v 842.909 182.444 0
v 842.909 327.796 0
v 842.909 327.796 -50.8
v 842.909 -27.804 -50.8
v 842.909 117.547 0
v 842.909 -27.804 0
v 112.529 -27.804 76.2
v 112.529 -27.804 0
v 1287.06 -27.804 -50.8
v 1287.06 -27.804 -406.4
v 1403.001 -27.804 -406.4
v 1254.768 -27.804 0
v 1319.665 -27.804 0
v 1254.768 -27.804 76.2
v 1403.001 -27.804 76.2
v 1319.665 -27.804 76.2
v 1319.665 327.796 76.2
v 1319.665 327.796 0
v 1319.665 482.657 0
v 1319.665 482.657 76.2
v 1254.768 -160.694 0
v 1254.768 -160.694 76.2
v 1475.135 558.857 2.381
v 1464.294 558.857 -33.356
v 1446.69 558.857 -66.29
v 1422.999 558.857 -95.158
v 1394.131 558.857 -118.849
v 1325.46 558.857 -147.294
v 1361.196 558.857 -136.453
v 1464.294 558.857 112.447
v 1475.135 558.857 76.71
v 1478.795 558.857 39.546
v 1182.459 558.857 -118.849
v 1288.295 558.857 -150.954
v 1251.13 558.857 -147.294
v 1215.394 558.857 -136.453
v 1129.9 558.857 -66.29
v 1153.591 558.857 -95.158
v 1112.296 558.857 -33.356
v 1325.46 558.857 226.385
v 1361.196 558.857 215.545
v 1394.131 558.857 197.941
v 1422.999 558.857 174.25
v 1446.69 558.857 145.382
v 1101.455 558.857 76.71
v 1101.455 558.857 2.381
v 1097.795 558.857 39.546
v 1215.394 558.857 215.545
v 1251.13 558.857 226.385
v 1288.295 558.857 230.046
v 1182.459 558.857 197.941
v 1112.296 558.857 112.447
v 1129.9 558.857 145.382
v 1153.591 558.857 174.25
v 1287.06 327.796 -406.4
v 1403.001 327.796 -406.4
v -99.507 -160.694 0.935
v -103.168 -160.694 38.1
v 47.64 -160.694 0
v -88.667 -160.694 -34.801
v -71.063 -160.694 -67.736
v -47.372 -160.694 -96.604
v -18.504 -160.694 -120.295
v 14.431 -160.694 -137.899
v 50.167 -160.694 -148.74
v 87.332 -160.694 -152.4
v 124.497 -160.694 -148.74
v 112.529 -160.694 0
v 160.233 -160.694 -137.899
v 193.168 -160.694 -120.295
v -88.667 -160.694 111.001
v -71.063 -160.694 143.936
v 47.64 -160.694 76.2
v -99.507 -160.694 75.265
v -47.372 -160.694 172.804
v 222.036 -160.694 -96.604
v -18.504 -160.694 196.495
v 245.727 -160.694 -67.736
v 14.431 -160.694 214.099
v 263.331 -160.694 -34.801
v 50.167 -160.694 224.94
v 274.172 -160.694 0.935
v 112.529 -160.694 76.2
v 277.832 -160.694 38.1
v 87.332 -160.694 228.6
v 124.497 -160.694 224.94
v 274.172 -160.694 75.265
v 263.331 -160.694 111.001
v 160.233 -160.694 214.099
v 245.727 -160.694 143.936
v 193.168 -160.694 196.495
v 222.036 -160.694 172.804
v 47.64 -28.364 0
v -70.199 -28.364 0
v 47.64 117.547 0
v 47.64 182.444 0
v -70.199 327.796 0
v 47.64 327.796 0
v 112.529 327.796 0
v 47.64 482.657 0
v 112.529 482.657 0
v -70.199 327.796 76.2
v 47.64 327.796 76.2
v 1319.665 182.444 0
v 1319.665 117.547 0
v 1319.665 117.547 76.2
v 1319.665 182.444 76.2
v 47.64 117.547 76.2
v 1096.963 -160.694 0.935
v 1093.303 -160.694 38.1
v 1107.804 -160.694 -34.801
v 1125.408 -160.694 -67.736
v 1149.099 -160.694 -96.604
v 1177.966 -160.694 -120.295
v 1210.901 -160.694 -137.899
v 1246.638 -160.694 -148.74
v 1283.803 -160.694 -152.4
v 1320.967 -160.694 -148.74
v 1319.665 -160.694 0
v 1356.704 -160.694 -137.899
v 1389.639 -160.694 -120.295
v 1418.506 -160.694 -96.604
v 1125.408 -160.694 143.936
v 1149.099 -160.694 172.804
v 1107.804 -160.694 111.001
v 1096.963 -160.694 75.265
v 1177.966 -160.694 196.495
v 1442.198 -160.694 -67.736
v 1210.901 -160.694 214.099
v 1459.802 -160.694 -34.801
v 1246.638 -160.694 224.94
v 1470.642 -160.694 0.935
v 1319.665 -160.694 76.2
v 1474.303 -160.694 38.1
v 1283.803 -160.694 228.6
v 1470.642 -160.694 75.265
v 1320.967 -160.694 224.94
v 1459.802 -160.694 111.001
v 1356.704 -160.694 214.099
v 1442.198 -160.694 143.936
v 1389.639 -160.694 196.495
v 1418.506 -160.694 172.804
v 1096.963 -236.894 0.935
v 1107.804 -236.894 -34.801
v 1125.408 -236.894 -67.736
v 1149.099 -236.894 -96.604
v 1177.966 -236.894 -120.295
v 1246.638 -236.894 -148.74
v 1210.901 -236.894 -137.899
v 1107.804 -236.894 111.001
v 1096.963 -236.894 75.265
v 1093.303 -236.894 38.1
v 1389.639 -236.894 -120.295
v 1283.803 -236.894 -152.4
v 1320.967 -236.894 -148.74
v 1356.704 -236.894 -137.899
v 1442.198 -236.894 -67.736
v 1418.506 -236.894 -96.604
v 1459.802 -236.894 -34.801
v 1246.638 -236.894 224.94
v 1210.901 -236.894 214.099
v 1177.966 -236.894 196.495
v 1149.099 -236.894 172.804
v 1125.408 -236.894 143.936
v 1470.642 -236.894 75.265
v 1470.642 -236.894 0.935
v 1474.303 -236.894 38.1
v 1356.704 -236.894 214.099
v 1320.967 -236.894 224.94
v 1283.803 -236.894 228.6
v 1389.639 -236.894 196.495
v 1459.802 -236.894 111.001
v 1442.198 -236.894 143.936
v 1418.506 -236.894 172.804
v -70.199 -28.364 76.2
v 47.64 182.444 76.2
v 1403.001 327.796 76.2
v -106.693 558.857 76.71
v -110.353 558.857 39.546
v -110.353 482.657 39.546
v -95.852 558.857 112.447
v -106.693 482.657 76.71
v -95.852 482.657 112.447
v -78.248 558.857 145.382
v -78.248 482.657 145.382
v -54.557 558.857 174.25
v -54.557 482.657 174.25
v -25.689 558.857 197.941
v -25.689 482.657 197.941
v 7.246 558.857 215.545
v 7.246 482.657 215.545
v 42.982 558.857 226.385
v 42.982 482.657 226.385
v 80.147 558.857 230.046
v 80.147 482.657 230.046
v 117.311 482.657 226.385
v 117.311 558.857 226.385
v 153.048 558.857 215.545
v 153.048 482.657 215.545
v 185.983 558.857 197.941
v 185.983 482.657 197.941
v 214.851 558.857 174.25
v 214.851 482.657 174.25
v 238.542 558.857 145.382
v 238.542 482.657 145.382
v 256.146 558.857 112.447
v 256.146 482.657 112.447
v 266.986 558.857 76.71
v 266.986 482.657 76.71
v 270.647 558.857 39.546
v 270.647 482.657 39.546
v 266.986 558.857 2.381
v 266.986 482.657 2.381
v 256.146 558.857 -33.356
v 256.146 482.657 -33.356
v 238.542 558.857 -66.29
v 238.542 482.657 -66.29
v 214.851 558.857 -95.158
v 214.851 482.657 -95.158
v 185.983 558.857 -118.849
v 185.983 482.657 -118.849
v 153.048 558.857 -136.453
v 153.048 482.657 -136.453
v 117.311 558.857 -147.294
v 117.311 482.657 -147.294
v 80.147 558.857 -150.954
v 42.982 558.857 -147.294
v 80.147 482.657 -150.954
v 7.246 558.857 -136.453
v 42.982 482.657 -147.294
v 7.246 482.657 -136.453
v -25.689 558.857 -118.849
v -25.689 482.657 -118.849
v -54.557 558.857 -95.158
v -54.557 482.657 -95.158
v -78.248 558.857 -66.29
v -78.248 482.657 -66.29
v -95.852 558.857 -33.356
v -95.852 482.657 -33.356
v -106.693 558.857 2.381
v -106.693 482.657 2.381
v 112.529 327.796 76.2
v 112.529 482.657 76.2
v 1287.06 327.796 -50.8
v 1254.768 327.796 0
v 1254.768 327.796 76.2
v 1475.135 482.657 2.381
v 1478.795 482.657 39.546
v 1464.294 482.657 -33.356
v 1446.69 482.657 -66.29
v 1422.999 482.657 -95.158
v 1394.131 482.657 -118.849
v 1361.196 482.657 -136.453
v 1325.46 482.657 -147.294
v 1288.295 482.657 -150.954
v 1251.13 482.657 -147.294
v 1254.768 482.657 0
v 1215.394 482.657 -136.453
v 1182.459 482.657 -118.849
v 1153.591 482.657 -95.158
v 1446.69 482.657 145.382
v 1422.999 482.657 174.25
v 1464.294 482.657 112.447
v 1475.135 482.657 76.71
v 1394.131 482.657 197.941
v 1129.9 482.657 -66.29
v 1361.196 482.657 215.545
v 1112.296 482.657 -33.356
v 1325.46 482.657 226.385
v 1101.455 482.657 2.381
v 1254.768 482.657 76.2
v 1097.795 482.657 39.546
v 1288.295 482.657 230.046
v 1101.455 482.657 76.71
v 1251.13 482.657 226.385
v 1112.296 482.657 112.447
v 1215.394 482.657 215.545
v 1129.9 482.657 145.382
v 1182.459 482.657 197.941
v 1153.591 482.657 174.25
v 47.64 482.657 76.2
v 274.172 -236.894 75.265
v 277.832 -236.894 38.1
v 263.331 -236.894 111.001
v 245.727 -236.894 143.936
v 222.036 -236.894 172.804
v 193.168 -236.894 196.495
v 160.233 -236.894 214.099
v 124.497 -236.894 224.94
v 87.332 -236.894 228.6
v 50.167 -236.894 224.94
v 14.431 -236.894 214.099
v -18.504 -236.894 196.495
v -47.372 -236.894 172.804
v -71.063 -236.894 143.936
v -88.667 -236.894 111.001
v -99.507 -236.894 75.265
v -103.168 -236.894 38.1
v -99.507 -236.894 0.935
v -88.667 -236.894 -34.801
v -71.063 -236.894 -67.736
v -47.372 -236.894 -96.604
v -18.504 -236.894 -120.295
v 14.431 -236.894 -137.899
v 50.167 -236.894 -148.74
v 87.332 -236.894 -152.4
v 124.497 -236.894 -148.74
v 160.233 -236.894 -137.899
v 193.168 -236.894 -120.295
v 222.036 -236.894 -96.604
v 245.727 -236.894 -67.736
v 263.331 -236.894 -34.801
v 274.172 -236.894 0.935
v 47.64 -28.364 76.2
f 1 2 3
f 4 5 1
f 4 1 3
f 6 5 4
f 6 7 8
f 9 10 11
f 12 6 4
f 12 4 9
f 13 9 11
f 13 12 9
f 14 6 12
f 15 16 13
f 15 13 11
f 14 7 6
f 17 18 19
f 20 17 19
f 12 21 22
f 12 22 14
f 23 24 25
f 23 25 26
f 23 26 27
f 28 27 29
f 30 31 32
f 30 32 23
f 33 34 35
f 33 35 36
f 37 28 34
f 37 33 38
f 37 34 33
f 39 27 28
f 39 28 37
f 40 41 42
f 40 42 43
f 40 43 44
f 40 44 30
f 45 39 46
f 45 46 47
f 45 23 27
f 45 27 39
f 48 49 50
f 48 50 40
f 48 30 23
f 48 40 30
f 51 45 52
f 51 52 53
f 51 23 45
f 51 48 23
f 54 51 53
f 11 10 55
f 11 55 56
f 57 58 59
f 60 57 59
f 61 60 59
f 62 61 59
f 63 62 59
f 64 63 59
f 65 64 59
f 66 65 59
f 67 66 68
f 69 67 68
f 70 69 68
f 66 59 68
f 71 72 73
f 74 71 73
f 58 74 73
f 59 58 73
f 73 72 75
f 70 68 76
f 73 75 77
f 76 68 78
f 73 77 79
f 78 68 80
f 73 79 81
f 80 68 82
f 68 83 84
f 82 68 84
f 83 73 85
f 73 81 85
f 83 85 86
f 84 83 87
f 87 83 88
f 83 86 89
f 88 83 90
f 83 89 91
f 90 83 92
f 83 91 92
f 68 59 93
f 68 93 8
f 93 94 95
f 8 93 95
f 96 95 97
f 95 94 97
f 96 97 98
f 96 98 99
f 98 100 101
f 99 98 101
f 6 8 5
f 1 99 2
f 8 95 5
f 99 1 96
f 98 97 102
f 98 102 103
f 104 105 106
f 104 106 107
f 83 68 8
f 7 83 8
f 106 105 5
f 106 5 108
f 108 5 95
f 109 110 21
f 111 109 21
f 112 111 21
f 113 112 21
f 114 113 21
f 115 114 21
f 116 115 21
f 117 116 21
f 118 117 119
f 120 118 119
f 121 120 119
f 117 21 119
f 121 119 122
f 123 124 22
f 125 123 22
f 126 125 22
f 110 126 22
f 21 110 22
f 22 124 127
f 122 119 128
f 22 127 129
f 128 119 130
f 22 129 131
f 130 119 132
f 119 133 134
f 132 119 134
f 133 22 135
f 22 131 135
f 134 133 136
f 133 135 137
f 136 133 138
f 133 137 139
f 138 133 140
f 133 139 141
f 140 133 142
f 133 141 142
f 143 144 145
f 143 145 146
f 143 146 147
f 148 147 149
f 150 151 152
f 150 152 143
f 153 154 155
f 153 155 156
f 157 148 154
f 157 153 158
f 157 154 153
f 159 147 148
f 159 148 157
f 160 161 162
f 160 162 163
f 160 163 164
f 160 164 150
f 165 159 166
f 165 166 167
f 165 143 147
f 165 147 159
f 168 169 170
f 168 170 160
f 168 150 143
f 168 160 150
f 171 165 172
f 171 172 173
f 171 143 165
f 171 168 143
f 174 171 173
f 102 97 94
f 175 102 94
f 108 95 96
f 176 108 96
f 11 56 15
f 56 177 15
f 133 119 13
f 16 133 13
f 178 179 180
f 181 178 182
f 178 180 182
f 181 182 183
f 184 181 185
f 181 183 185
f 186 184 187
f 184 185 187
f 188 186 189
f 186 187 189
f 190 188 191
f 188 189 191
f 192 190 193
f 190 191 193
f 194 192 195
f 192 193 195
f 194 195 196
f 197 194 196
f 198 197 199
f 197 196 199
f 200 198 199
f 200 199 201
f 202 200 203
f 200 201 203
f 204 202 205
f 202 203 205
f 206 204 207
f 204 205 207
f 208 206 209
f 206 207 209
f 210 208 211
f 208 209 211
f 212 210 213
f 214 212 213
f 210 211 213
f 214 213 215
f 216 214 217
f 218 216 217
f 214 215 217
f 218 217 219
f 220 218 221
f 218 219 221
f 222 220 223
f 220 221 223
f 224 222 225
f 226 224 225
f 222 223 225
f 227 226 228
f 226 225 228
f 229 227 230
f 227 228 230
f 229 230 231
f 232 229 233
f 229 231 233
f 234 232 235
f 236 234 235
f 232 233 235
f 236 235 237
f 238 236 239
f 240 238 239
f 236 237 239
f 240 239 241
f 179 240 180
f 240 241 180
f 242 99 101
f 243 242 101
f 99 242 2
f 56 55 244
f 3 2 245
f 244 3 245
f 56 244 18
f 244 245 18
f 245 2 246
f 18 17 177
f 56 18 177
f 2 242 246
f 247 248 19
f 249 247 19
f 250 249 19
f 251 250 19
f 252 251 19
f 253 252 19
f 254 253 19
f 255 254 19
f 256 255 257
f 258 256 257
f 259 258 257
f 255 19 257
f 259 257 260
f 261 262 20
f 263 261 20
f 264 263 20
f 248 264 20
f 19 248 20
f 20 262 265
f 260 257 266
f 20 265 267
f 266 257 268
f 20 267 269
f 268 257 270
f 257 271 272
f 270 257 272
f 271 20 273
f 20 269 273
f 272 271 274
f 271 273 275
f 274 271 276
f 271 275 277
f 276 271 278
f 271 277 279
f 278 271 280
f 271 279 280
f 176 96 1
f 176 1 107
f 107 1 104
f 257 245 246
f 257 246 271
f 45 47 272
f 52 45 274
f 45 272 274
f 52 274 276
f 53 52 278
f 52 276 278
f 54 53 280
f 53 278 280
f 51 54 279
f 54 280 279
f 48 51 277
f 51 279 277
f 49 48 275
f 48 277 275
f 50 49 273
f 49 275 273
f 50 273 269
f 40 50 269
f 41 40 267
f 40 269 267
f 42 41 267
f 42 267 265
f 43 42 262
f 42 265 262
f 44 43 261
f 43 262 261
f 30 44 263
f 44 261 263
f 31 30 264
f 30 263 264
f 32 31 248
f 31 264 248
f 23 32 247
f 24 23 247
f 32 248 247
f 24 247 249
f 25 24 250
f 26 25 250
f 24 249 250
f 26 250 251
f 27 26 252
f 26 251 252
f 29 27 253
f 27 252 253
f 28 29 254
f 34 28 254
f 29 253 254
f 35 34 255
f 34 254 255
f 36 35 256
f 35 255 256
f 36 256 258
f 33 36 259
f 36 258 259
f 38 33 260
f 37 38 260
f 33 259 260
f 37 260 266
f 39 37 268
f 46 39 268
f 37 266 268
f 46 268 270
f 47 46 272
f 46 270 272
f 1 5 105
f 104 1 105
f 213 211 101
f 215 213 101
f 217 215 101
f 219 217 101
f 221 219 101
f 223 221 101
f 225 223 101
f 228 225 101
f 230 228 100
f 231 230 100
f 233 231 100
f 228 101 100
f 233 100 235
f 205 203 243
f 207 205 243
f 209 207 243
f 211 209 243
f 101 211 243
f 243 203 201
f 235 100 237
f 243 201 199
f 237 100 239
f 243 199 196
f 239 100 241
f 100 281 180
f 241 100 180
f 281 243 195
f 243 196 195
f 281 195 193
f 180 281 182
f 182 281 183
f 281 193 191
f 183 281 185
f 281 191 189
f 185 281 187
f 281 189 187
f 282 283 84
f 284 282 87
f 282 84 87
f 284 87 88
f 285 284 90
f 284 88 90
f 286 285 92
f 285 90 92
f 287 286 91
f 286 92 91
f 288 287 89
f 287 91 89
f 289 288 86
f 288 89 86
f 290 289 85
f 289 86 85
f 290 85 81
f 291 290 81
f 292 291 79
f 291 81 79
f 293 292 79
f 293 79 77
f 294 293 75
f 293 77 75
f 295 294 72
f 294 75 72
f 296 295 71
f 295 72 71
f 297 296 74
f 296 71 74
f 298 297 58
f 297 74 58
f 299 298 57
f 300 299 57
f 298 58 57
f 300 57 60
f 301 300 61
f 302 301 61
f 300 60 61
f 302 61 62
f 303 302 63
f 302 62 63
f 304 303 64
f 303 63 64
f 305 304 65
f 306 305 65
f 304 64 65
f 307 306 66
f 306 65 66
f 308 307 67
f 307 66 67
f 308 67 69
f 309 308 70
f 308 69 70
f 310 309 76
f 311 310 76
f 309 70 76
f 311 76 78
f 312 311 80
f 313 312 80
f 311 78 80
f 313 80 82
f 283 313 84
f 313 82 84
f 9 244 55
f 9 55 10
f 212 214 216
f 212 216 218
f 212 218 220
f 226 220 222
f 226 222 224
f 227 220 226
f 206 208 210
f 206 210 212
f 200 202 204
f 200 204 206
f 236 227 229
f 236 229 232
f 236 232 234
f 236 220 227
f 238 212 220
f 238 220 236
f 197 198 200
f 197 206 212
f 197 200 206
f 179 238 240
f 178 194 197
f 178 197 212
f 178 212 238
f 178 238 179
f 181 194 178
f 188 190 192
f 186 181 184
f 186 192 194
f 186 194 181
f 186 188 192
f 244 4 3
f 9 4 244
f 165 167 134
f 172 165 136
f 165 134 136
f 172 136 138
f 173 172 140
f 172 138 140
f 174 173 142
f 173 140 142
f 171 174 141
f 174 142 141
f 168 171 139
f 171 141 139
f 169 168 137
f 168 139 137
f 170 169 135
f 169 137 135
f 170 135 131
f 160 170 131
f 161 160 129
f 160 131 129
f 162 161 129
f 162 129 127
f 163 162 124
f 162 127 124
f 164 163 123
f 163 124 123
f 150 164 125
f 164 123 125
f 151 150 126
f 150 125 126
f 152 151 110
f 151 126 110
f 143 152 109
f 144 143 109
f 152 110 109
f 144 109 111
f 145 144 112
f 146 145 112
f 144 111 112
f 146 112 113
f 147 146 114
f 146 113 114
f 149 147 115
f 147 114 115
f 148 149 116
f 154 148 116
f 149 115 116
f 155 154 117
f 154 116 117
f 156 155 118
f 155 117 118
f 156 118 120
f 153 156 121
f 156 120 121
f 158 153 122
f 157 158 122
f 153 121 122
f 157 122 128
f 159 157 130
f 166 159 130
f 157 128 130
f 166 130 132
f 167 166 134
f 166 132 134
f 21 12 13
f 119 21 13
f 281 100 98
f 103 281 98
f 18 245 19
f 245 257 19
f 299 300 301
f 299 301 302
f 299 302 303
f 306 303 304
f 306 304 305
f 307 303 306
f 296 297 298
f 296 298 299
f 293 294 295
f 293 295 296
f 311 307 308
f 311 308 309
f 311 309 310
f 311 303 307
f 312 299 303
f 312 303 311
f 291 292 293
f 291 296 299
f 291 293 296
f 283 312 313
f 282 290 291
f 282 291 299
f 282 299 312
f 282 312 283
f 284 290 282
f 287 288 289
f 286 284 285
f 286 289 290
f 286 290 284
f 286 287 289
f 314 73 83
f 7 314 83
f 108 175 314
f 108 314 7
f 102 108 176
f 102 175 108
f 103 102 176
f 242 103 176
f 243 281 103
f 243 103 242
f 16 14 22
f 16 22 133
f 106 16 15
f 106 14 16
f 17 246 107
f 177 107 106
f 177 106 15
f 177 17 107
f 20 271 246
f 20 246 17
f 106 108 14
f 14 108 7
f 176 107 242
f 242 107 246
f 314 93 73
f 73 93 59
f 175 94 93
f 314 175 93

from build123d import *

# Parameters (mm, degrees)
F0_W     = 519.4771289825
F0_H     = 145.3515
F0_W_2   = 78.8426995277
F0_W_3   = 543.9197421074
F0_W_4   = 64.8887902498
F0_W_5   = 117.8393810987
F0_H_2   = 64.897
F0_H_3   = 145.9111776203
F0_W_6   = 64.897
F0_H_4   = 132.8892552004
F0_H_5   = 154.8609585657
F0_W_7   = 83.3352580338
F1_DEPTH = 76.2
F2_R     = 190.5
F3_DEPTH = 76.2
F4_R     = 190.5
F5_DEPTH = 76.2
F6_W     = 560.091412735
F6_H     = 355.6
F7_DEPTH = 50.8
F8_W     = 115.9408456802
F8_H     = 355.6
F9_DEPTH = 355.6


with BuildPart() as f1:
    # F0 (on Top) → F1 (new body)
    with BuildSketch(Plane.XY):
        with Locations((372.2674846649, 44.8714789324)):
            Rectangle(F0_W, F0_H)
        Polygon((112.5289201736, -160.693526268), (112.5289201736, -27.8042710676), (112.5289201736, 117.5472289324), (47.6401299238, 117.5472289324), (47.6401299238, -28.3639486879), (47.6401299238, -160.693526268), align=None)
        with Locations((671.4273989201, 44.8714789324)):
            Rectangle(F0_W_2, F0_H)
        with Locations((982.8086197376, 44.8714789324)):
            Rectangle(F0_W_3, F0_H)
        with Locations((80.0845250487, 255.1199789324)):
            Rectangle(F0_W_4, F0_H)
        Polygon((112.5289201736, 327.7957289324), (112.5289201736, 182.4442289324), (632.0060491562, 182.4442289324), (632.0060491562, 327.7957289324), (539.4007488251, 327.7957289324), align=None)
        with Locations((-11.2795606256, 149.9957289324)):
            Rectangle(F0_W_5, F0_H_2)
        with Locations((-11.2795606256, 44.5916401222)):
            Rectangle(F0_W_5, F0_H_3)
        with Locations((1287.2169907913, 44.8714789324)):
            Rectangle(F0_W_6, F0_H)
        with Locations((1287.2169907913, -94.2488986678)):
            Rectangle(F0_W_6, F0_H_4)
        Polygon((632.0060491562, 327.7957289324), (632.0060491562, 182.4442289324), (710.8487486839, 182.4442289324), (710.8487486839, 327.7957289324), (666.4007488251, 327.7957289324), align=None)
        with Locations((80.0845250487, 405.2262082152)):
            Rectangle(F0_W_4, F0_H_5)
        with Locations((-11.2795606256, 255.1199789324)):
            Rectangle(F0_W_5, F0_H)
        with Locations((1361.3331198082, 44.8714789324)):
            Rectangle(F0_W_7, F0_H)
        with Locations((982.8086197376, 255.1199789324)):
            Rectangle(F0_W_3, F0_H)
        with Locations((1361.3331198082, 149.9957289324)):
            Rectangle(F0_W_7, F0_H_2)
        with Locations((1287.2169907913, 255.1199789324)):
            Rectangle(F0_W_6, F0_H)
        with Locations((1361.3331198082, 255.1199789324)):
            Rectangle(F0_W_7, F0_H)
        with Locations((1287.2169907913, 405.2262082152)):
            Rectangle(F0_W_6, F0_H_5)
    extrude(amount=F1_DEPTH)

    # F2 (on face) → F3 (join)
    with BuildSketch(Plane(origin=(0, 482.6566874981, 0), x_dir=(-1, 0, 0), z_dir=(0, 1, 0))):
        with Locations((-80.1467373967, 39.5456925035)):
            Circle(F2_R)
        with Locations((-1288.2950305939, 39.5456925035)):
            Circle(F2_R)
    extrude(amount=F3_DEPTH)

    # F4 (on face) → F5 (join)
    with BuildSketch(Plane.XZ.offset(160.693526268)):
        with Locations((1283.8026285172, 38.1)):
            Circle(F4_R)
        with Locations((87.3321071267, 38.1)):
            Circle(F4_R)
    extrude(amount=F5_DEPTH)

    # F6 (on face) → F7 (join)
    with BuildSketch(Plane(origin=(0, 0, 0), x_dir=(1, 0, 0), z_dir=(0, 0, -1))):
        with Locations((1122.9550424576, -149.9957289324)):
            Rectangle(F6_W, F6_H)
    extrude(amount=F7_DEPTH)

    # F8 (on face) → F9 (join)
    with BuildSketch(Plane(origin=(0, 0, -50.8), x_dir=(1, 0, 0), z_dir=(0, 0, -1))):
        with Locations((1345.030325985, -149.9957289324)):
            Rectangle(F8_W, F8_H)
    extrude(amount=F9_DEPTH)


solid = f1.part
